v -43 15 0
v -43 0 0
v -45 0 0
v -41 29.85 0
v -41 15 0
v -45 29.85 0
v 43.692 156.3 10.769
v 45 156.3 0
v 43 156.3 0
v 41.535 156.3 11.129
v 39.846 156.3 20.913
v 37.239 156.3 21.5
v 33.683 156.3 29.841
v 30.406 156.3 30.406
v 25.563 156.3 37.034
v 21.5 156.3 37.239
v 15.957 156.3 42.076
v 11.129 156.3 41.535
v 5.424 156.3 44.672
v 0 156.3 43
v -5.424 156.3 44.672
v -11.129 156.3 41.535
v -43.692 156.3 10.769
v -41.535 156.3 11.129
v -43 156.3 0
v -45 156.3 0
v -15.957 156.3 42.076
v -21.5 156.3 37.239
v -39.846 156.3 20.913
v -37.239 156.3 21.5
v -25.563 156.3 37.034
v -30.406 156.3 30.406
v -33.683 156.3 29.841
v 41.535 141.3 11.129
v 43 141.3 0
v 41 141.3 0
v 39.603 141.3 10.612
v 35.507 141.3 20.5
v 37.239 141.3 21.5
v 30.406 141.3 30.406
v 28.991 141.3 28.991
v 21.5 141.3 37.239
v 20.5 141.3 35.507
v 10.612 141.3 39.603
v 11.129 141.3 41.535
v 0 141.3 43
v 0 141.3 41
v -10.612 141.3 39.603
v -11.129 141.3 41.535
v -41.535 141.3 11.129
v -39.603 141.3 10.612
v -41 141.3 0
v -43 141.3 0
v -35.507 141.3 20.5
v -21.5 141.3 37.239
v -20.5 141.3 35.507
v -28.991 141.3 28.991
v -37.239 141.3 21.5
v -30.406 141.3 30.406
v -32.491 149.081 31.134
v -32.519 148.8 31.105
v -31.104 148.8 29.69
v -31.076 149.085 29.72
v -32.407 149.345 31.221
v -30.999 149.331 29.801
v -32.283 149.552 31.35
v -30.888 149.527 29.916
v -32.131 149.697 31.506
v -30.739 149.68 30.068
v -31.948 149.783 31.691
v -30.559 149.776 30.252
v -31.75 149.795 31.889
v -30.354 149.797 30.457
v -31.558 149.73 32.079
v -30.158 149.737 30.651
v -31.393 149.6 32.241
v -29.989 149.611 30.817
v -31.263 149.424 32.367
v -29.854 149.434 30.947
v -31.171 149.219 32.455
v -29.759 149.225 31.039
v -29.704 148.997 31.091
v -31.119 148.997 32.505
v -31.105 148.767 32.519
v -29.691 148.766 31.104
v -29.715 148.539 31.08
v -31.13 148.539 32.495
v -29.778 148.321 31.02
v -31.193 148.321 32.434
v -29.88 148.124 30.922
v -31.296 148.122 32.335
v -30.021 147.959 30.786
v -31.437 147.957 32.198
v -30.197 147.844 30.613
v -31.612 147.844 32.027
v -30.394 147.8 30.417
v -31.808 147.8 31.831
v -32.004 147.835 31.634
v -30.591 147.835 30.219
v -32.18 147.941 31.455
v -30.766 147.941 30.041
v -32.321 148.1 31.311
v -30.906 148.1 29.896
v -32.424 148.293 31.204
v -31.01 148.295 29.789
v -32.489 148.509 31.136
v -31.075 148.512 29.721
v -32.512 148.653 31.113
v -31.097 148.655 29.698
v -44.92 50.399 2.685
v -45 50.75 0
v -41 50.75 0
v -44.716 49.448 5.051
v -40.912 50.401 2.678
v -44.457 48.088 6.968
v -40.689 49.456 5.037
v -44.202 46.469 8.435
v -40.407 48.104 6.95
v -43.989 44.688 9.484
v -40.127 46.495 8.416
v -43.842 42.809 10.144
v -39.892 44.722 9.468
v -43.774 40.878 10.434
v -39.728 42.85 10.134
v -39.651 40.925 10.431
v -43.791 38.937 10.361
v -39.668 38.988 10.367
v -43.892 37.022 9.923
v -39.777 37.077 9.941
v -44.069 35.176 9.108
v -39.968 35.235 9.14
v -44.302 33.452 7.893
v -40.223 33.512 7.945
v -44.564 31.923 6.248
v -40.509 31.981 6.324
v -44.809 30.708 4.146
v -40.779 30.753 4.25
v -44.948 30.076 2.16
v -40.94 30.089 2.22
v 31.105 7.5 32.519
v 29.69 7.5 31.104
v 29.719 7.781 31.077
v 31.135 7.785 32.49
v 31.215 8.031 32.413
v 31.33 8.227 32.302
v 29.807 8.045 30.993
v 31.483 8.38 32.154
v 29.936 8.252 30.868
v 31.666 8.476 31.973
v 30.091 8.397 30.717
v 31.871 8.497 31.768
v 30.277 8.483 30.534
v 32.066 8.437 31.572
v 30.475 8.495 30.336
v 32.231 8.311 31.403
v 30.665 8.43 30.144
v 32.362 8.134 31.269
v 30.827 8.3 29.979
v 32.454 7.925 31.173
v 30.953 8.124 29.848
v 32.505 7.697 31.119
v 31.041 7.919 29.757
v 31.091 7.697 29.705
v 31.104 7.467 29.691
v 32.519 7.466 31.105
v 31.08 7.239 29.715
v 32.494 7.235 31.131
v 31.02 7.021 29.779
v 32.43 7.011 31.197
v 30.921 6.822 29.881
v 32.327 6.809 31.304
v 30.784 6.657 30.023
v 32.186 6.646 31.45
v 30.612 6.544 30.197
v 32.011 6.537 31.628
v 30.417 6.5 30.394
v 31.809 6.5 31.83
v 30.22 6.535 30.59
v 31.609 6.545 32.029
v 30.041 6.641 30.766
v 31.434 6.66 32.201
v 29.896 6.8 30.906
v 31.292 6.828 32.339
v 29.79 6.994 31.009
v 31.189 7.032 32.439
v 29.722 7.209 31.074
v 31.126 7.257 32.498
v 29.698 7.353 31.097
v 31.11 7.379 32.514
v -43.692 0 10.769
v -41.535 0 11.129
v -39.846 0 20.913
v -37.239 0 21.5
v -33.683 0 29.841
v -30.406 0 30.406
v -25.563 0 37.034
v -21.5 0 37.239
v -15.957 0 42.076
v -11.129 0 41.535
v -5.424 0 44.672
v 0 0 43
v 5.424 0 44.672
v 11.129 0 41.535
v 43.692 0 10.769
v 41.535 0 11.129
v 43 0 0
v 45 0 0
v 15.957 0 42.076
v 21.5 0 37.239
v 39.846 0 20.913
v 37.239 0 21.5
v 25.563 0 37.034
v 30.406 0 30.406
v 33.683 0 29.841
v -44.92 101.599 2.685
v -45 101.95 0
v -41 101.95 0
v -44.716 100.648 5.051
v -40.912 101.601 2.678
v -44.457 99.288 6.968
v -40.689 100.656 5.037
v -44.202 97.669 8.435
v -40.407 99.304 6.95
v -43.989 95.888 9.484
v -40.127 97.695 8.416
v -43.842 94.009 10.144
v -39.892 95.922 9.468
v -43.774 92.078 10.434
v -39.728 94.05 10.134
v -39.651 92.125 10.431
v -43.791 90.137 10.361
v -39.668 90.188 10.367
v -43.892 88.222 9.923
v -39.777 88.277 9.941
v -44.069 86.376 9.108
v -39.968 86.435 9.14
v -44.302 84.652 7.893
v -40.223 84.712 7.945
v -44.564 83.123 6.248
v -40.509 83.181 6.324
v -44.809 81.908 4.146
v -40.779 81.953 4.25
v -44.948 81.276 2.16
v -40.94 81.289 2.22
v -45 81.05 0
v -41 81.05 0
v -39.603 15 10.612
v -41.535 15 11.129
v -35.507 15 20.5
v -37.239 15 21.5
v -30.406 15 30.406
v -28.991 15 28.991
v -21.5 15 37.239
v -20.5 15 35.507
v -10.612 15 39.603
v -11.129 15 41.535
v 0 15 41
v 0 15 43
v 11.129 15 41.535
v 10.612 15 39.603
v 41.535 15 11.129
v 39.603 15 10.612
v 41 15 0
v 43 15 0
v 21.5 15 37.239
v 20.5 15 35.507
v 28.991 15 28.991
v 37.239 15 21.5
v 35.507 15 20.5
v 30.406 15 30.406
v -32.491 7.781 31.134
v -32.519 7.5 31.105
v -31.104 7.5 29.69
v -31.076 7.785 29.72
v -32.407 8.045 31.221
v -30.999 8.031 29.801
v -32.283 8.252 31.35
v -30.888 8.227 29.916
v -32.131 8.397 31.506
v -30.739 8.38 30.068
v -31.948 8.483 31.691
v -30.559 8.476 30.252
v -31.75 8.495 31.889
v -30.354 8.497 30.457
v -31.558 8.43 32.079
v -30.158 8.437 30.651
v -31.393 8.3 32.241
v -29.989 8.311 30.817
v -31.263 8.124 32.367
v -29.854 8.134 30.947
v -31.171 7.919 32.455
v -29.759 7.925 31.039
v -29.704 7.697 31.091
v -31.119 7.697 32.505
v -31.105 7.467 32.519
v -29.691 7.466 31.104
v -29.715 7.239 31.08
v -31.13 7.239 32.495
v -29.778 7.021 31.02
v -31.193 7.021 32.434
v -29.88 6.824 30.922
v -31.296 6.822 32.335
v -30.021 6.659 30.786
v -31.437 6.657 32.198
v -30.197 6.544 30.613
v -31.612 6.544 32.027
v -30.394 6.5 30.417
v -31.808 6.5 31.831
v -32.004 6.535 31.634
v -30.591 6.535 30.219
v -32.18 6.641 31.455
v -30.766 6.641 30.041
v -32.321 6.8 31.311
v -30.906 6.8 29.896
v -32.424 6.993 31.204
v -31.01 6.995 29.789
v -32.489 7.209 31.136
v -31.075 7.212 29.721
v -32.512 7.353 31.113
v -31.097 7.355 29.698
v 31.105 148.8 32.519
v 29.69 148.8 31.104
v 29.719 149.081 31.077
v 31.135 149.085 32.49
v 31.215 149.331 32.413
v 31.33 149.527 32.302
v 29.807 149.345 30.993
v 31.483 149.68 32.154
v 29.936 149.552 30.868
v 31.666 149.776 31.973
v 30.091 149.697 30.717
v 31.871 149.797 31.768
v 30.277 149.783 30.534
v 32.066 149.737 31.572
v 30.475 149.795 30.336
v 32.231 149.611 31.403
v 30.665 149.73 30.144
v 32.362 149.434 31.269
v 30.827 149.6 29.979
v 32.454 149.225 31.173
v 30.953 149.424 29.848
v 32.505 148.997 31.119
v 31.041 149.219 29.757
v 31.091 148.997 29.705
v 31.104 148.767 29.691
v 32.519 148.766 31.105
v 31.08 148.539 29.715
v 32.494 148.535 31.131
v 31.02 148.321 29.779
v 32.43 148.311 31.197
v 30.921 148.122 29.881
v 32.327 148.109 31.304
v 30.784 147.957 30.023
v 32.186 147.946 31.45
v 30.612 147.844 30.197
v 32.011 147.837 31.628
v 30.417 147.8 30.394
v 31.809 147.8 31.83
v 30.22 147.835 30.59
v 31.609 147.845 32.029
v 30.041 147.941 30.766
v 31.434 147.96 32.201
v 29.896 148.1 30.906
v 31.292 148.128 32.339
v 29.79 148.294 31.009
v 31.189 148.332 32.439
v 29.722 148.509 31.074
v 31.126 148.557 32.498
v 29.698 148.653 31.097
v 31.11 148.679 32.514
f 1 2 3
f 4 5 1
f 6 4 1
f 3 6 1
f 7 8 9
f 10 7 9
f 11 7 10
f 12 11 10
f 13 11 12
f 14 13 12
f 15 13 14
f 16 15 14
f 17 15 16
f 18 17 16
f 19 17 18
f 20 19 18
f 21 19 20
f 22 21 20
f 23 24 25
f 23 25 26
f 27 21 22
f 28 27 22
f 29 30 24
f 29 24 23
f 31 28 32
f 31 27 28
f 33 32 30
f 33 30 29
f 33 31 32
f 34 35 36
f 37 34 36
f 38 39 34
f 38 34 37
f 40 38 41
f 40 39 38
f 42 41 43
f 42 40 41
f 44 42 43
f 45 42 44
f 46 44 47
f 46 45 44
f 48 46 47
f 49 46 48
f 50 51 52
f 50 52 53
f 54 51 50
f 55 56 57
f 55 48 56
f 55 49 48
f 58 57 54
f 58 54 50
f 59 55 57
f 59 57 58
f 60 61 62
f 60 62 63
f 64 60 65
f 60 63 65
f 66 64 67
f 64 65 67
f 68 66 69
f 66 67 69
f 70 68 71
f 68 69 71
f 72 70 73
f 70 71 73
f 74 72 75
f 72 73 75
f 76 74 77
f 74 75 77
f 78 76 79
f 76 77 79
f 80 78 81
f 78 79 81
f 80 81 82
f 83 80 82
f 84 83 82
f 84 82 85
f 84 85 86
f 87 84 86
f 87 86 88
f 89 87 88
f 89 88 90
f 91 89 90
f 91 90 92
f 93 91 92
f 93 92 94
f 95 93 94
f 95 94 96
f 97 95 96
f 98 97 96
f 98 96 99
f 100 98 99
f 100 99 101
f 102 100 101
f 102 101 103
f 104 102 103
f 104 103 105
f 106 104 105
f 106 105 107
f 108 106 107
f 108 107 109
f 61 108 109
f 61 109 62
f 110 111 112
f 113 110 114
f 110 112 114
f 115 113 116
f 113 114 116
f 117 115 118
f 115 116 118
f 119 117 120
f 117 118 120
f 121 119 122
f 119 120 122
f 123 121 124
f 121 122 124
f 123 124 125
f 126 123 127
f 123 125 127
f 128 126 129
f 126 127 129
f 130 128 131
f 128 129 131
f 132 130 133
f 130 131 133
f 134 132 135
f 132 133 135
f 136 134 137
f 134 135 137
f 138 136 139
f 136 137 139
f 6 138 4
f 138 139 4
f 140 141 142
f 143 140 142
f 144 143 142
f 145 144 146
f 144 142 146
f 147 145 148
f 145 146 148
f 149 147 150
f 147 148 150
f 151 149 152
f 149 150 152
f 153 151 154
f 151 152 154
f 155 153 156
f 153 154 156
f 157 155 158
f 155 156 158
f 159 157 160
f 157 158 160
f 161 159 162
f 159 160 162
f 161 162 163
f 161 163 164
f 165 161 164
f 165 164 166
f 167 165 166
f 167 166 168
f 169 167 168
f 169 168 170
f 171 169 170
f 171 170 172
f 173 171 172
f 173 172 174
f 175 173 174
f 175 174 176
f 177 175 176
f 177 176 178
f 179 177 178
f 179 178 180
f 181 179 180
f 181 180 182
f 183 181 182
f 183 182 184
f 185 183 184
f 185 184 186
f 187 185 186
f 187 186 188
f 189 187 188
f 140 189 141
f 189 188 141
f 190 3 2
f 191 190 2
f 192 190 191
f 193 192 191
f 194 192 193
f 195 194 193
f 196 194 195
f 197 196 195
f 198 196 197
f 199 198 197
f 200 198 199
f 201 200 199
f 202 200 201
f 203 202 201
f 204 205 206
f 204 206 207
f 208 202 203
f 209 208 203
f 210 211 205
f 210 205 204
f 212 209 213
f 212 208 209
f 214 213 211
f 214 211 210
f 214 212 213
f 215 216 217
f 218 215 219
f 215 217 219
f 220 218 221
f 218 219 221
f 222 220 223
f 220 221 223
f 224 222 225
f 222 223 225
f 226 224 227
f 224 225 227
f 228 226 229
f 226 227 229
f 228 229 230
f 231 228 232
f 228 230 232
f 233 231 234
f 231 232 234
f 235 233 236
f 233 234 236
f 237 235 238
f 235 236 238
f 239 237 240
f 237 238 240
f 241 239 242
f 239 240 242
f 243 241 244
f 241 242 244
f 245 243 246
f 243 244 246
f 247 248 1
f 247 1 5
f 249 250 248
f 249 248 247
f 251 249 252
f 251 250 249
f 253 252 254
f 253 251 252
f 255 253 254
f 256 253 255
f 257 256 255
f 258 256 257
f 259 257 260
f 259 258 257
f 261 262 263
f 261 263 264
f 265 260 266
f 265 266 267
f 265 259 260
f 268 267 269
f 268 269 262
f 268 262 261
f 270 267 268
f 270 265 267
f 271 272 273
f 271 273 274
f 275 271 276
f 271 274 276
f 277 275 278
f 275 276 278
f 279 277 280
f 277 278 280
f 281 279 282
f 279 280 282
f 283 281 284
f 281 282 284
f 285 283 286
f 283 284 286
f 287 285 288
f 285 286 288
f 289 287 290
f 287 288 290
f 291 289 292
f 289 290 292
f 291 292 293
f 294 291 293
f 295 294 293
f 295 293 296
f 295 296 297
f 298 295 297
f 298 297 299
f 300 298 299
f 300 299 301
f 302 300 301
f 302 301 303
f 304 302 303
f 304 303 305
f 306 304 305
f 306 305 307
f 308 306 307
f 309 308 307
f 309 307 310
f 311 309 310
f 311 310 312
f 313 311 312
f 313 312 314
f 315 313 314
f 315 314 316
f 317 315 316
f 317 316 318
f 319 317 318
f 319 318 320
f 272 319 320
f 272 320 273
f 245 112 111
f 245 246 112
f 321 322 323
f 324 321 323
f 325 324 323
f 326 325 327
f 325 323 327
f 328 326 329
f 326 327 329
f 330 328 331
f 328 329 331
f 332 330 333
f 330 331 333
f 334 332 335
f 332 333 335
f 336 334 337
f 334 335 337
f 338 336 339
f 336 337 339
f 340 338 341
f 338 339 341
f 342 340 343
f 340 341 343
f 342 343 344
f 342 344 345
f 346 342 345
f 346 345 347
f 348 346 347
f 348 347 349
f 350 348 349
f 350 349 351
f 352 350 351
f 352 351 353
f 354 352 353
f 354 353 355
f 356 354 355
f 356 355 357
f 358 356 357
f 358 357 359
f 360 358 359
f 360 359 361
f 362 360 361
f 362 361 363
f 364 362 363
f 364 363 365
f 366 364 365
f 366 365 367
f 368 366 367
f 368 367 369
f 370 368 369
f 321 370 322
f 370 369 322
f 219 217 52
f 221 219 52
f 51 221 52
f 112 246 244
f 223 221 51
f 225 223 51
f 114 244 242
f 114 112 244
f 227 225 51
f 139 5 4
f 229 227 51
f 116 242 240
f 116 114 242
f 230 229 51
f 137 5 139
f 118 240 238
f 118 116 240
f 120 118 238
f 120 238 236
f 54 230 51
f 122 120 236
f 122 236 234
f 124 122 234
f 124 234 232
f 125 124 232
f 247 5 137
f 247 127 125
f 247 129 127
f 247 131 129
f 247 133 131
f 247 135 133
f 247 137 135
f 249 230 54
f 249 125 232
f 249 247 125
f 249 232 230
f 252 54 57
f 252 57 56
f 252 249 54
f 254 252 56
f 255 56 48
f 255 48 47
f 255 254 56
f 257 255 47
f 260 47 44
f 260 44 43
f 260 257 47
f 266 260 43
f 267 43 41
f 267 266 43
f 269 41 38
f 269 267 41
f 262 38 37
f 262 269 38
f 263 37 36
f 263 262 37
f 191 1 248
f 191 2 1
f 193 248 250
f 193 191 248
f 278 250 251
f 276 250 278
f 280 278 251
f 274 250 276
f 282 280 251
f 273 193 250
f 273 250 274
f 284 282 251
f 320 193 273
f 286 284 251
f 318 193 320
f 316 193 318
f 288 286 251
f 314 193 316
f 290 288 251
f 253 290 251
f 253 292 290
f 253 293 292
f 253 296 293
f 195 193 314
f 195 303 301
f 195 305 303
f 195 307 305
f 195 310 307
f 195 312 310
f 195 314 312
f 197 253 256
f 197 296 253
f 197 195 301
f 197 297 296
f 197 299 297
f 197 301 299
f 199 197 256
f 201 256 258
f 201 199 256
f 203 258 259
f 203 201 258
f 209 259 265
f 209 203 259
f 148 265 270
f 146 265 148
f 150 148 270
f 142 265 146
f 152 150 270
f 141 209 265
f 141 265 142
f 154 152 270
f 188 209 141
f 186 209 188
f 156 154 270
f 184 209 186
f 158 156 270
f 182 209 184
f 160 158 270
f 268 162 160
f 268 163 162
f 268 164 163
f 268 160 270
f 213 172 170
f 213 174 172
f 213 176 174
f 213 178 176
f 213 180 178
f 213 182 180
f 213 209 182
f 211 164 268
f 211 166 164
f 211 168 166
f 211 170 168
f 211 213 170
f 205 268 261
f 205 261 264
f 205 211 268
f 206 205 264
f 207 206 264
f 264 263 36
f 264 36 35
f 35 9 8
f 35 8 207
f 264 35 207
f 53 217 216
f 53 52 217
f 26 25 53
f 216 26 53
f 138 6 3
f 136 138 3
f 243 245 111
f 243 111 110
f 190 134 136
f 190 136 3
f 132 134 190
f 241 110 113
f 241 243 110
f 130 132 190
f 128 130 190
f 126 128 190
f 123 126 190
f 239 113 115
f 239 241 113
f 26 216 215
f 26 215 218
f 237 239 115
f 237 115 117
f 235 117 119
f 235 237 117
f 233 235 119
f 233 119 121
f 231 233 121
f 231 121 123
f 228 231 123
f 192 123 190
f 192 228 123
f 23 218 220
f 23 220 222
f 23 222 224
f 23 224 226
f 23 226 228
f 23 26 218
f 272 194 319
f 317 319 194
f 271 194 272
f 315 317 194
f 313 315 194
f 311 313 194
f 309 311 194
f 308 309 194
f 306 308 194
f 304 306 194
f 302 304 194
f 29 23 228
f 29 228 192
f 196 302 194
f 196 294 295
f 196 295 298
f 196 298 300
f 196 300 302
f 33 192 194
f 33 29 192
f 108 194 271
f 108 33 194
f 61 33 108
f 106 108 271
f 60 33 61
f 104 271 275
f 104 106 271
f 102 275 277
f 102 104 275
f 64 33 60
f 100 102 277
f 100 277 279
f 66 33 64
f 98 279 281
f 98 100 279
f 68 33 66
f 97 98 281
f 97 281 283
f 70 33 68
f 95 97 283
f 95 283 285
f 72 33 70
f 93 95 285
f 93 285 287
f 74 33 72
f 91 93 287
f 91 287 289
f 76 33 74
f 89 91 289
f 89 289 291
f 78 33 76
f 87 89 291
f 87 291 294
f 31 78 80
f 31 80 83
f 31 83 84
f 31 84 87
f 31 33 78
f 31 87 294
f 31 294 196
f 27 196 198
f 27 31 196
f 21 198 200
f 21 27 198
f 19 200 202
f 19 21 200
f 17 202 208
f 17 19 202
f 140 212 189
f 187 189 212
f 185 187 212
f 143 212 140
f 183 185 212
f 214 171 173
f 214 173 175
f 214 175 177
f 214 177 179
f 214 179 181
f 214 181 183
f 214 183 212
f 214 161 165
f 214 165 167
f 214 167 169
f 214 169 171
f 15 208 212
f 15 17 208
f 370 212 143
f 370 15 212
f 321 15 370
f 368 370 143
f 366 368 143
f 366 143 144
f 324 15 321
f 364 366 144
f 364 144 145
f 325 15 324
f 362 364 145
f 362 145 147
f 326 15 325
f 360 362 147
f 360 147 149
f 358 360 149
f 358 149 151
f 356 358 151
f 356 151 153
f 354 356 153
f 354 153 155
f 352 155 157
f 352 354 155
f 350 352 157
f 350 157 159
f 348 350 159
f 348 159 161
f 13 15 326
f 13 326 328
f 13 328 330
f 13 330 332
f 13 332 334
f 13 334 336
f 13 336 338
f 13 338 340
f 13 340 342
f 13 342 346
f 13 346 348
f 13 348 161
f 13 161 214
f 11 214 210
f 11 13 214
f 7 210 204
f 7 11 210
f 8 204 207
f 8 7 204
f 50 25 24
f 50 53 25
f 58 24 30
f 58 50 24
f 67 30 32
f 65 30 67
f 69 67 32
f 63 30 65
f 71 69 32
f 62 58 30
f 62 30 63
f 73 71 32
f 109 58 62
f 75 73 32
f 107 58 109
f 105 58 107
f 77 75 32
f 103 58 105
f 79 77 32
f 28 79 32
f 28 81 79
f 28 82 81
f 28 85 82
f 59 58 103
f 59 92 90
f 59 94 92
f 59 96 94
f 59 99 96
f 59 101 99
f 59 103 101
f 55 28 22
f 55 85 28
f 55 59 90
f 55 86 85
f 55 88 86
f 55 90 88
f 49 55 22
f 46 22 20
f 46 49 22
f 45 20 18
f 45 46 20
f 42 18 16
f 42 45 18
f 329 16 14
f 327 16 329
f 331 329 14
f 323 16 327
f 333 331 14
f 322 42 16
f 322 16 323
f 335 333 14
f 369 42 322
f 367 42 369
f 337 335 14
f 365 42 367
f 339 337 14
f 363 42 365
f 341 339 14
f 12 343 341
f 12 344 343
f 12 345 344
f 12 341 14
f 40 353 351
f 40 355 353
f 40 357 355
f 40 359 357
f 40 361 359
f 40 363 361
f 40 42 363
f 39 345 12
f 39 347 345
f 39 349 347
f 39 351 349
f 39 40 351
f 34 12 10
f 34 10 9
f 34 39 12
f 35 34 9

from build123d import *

# Parameters (mm, degrees)
REVOLVE1_ANGLE     = 180
SKETCH2_R          = 10.45
CUT_EXTRUDE1_DEPTH = 169.759266412
SKETCH3_R          = 1
CUT_EXTRUDE2_DEPTH = 169.759266558
CIRPATTERN1_COUNT  = 4


with BuildPart() as part:
    # Sketch1 → Revolve1 (revolve)
    with BuildSketch(Plane.XY):
        Polygon((-45, 0), (-45, 156.3), (-43, 156.3), (-43, 141.3), (-41, 141.3), (-41, 15), (-43, 15), (-43, 0), align=None)
    revolve(axis=Axis((0, 0, 0), (0, 1, 0)), revolution_arc=REVOLVE1_ANGLE)

    # Sketch2 → Cut-Extrude1 (cut, through all)
    with BuildSketch(Plane(origin=(0, 0, 0), x_dir=(0, 0, -1), z_dir=(1, 0, 0))):
        with Locations((0, 40.3)):
            Circle(SKETCH2_R)
        with Locations((0, 91.5)):
            Circle(SKETCH2_R)
    extrude(amount=-CUT_EXTRUDE1_DEPTH, mode=Mode.SUBTRACT)

    # Sketch3 → Cut-Extrude2 (cut, through all)
    with BuildSketch(Plane(origin=(0, 0, 0), x_dir=(0, 1, 0), z_dir=(0.7071067811865464, 0, -0.7071067811865488))):
        with Locations(Location((7.5, 0, 0), (0, 0, 270))):
            Circle(SKETCH3_R)
        with Locations(Location((148.8, 0, 0), (0, 0, 270))):
            Circle(SKETCH3_R)
    cut_extrude2 = extrude(amount=-CUT_EXTRUDE2_DEPTH, mode=Mode.SUBTRACT)

    # CirPattern1: Cut-Extrude2 ×4 about axis
    cirpattern1_axis = Axis((0, 0, 0), (0, -1, 0))
    for i in range(1, CIRPATTERN1_COUNT):
        add(cut_extrude2.rotate(cirpattern1_axis, i * 360 / CIRPATTERN1_COUNT), mode=Mode.SUBTRACT)


solid = part.part
